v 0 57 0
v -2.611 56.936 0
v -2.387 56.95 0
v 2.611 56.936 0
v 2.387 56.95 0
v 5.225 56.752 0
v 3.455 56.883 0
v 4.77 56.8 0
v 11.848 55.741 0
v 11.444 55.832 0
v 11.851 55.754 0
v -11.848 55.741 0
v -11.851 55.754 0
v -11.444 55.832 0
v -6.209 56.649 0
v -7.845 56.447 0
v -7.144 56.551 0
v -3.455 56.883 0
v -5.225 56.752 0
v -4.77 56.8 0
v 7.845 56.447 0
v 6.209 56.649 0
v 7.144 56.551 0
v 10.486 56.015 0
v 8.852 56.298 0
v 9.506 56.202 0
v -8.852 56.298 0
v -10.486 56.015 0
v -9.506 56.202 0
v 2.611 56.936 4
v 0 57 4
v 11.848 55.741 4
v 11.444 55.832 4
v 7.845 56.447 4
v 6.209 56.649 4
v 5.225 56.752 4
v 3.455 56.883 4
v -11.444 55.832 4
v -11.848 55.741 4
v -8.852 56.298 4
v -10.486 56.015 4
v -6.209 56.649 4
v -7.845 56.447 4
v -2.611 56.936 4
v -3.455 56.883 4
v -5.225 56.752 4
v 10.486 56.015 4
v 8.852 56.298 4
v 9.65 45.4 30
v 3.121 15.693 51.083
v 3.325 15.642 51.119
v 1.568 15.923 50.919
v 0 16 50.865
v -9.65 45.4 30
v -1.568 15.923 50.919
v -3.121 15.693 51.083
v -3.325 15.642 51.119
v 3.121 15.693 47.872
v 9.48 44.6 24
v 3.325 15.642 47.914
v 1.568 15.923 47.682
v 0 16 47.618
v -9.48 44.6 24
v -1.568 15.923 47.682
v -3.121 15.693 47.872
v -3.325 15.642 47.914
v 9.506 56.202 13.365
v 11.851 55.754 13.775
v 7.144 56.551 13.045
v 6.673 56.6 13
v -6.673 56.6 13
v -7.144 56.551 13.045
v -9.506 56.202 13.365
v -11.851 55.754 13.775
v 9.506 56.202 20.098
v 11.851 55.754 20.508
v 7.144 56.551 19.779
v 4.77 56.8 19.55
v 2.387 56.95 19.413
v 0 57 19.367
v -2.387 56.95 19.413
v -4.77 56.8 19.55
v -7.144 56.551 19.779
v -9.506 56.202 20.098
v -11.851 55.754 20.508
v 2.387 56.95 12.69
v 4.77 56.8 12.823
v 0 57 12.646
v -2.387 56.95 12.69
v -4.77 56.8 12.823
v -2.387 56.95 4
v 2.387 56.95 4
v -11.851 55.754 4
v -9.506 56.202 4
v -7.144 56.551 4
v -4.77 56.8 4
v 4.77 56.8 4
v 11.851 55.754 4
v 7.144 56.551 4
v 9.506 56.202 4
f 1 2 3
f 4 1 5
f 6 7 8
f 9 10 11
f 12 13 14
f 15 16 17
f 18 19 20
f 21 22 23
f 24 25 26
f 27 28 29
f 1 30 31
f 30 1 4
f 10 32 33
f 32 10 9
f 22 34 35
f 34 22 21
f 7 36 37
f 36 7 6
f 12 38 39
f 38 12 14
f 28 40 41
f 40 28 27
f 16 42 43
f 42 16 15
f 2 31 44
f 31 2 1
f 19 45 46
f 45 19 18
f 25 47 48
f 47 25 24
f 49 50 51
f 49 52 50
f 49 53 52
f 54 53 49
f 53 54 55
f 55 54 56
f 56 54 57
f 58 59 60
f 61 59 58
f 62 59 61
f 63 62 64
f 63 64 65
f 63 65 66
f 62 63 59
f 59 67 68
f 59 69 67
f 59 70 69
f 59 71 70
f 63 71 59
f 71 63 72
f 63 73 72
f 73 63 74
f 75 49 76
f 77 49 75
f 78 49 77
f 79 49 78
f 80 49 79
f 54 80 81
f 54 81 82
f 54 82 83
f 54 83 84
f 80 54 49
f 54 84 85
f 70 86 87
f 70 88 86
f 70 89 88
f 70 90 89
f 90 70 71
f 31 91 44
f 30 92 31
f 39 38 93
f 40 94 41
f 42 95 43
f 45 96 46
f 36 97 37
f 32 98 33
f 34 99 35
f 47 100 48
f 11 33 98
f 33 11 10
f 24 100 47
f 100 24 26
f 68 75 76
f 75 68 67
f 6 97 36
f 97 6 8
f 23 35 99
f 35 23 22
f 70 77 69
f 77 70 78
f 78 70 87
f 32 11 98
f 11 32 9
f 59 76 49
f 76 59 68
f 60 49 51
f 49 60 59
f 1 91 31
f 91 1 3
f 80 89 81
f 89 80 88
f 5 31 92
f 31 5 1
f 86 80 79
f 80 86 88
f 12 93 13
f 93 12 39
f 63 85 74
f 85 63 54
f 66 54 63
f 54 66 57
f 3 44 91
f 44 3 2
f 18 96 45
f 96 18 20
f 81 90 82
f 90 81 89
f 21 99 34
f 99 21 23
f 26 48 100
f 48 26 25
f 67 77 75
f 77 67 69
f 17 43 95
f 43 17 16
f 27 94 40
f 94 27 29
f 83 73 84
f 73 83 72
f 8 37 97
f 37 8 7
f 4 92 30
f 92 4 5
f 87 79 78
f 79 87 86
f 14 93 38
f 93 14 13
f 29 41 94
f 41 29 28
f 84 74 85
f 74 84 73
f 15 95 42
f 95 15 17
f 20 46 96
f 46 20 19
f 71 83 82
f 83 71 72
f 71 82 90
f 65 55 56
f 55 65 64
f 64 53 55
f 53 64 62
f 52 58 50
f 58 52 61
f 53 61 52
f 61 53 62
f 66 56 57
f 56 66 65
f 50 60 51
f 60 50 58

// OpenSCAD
// file: part_b3_base_body.scad
// ============================================================================
// v3 PART B3 — base body (lower): electronics bay + integral 45 deg chute
//
// Splitting the housing here is what makes both halves printable: this one goes
// open-end-down, so the chute floor and the wall notch are all self-supporting.
//
// The ramp is one continuous surface from under the deck's wedge to the lip over
// the tray: the stations are hulled in sequence, and the notch through the wall
// is cut with its sill on the ramp line so it never breaches the floor.
// ============================================================================

include <parameters_v3.scad>;
include <lib_v3.scad>;

$fn = 128;

n_st = len(chute_stations);

module b3_floor_station(st) {
    w = st[2] + 2 * chute_wall;
    translate([-w / 2, st[0] - 0.4, st[1] - st[4]])
        cube([w, 0.8, st[4]]);
}

module b3_wall_station(st, side) {
    h = max(0.8, st[3] - st[1]);
    mirror([side < 0 ? 1 : 0, 0, 0])
        translate([st[2] / 2, st[0] - 0.4, st[1]]) cube([chute_wall, 0.8, h]);
}

// The ramp, as one continuous surface from under the deck's wedge to the lip.
module b3_chute_floor() {
    for (i = [0 : n_st - 2]) hull() {
        b3_floor_station(chute_stations[i]);
        b3_floor_station(chute_stations[i + 1]);
    }
}

module b3_chute_walls() {
    for (i = [0 : n_st - 2], s = [-1, 1]) hull() {
        b3_wall_station(chute_stations[i], s);
        b3_wall_station(chute_stations[i + 1], s);
    }
}

// The notch is a box MINUS the chute itself, so it can only ever remove housing
// wall — the ramp and the chute's side walls survive whatever the box does.
// A plain box (the first attempt) sliced the ramp out exactly where it passes
// through the wall and left a hole a tablet dropped through. Putting the box's
// sill on the ramp line closed the hole but made the cut coplanar with the
// ramp's own top surface, which is fragile; subtracting the chute is exact.
module b3_wall_notch(w, z0, z_top) {
    difference() {
        translate([-w / 2, h_ri - 5, z0])
            cube([w, (h_od / 2 + 4) - (h_ri - 5), z_top - z0]);
        b3_chute_floor();
        b3_chute_walls();
    }
}

// Shoulder fins tying the chute back into the bore. They also stiffen the wall
// either side of the notch. Below the deck, so they cannot foul the carousel.
module b3_shoulder(side) {
    st = chute_stations[1];
    mirror([side < 0 ? 1 : 0, 0, 0])
        intersection() {
            translate([st[2] / 2, st[0] - 1.5, st[1] - st[4]])
                cube([30, 3.0, st[3] - st[1] + st[4]]);
            cylinder(h = deck_z, d = h_id + wall);   // buried in the wall, no coplanar faces
        }
}

module b3_ear() {
    hull() {
        translate([h_od / 2 - 2, -ear_w / 2, deck_z - ear_t]) cube([ear_out + 2, ear_w, ear_t]);
        translate([h_od / 2 - 2, -ear_w / 2, deck_z - ear_t - 2]) cube([2, ear_w, 2]);
    }
}

module base_body_v3() {
    difference() {
        union() {
            tube(h_od, h_id, deck_z);

            // Chute: continuous ramp plus side walls sealing up to the deck.
            b3_chute_floor();
            b3_chute_walls();

            for (s = [-1, 1]) b3_shoulder(s);

            // Base-cover posts, grown from the build plate.
            for (a = post_angles)
                rotate([0, 0, a]) translate([post_r, 0, 0])
                    cylinder(h = 16, d = post_d);

            for (a = ear_angles) rotate([0, 0, a]) b3_ear();
        }

        b3_wall_notch(chute_win_w, chute_win_z0, chute_win_z1);

        // Trim anything above the split plane.
        translate([0, 0, deck_z]) cylinder(h = 60, d = h_od + 20);

        for (a = post_angles)
            rotate([0, 0, a]) translate([post_r, 0, -0.1])
                cylinder(h = 13, d = m3_pilot_d);

        for (a = ear_angles)
            rotate([0, 0, a])
                translate([h_od / 2 + ear_out / 2, 0, deck_z - ear_t - 0.1])
                    cylinder(h = ear_t + 0.2, d = m3_pilot_d);

        rotate([0, 0, 180])
            translate([-cable_w / 2, -(h_od / 2 + 2), 5])
                cube([cable_w, wall + 4, cable_h]);
    }
}

base_body_v3();

echo(str("B3 base body: height ", deck_z, ", bay clear height ",
         chute_stations[n_st - 2][1] - chute_wall));
echo(str("B3 chute exit: ", chute_stations[n_st - 1][2], " mm wide at z ",
         chute_stations[n_st - 1][1]));
// file: lib_v3.scad
// ============================================================================
// Shared geometry helpers for the v3 print set.   include <lib_v3.scad>;
// ============================================================================

// Wedge prism, centred on +X, spanning +/- ang/2, rising from z = 0.
module sector_prism(r, ang, h, seg = 64) {
    steps = max(4, ceil(ang / 2.5));   // ~2.5 deg chords, independent of ang
    linear_extrude(height = h)
        polygon(concat(
            [[0, 0]],
            [for (i = [0 : steps])
                let (a = -ang / 2 + ang * i / steps) [r * cos(a), r * sin(a)]]
        ));
}

// Annular sector prism, centred on +X, rising from z = 0.
module ring_sector(r_in, r_out, ang, h, seg = 64) {
    difference() {
        sector_prism(r_out, ang, h, seg);
        translate([0, 0, -0.05]) cylinder(h = h + 0.1, r = r_in, $fn = seg);
    }
}

module tube(od, id, h) {
    difference() {
        cylinder(h = h, d = od);
        translate([0, 0, -0.05]) cylinder(h = h + 0.1, d = id);
    }
}

// Inward ledge with a 45 deg self-supporting underside. Top face at z_top.
module chamfered_ledge(r_wall, w, z_top) {
    rotate_extrude(convexity = 4)
        polygon([[r_wall - w, z_top],
                 [r_wall,     z_top],
                 [r_wall,     z_top - w]]);
}

// Thin slab used as a hull station for the chute trough.
module station_slab(y, z, w, t = 0.6) {
    translate([-w / 2, y - t / 2, z]) cube([w, t, 0.6]);
}
// file: parameters_v3.scad
// ============================================================================
// Automated Pill Dispenser — v3 "integral deck + open carousel"
// Shared parametric dimensions.   include <parameters_v3.scad>;
//
// z = 0 is the underside of the base body; the base cover hangs below it, so
// the table plane is z = base_z. +Y is the front (chute, tray, camera).
//
// Mechanism: the deck holds the pills in. It has ONE wedge opening. The unit
// parks with the JUST-EMPTIED compartment sitting over that opening, so
// nothing can leak; a 45 deg step sweeps the next compartment across the
// opening and gravity empties it. One servo, no gate, no carousel floor.
//
// Sizing rule that makes the park state leak-proof: the opening's angular
// width must fit inside one compartment's interior with margin to spare, at
// the opening's INNER radius (where a divider subtends the most angle):
//
//     open_deg  <=  360/car_n - 2*asin(div_t / (2*open_r_in)) - 2*park_margin
//     24        <=  45        - 8.6                           - 2*6.2
//
// Widening the opening or moving it inward eats the parking margin.
// ============================================================================

// ---------------------------------------------------------------- print / fit
layer_h        = 0.2;
nozzle_d       = 0.4;
wall           = 3.0;
fit_slip       = 0.35;
fit_press      = 0.10;
m3_pilot_d     = 2.55;
m3_free_d      = 3.35;
m2_pilot_d     = 1.65;
m2_free_d      = 2.30;

// ---------------------------------------------------------------- drum
h_od           = 120.0;
h_id           = h_od - 2 * wall;          // 114
h_ri           = h_id / 2;                 // 57
rim_z          = 94.0;                     // top of the deck body wall

// ---------------------------------------------------------------- deck (A3)
deck_z         = 52.0;                     // deck underside / body split plane
deck_t         = 5.0;                      // structural: the deck IS the drum
deck_top       = deck_z + deck_t;          // 57
deck_fillet    = 1.2;                      // fillet where the wall meets the deck

// The one opening.
open_deg       = 24.0;
open_r_in      = 16.0;
open_r_out     = h_ri;                     // breaches the bore: nothing rides past
open_ctr       = 90.0;                     // front (+Y)
open_relief    = 1.2;                      // lead-in relief on the deck top face

// Centre pilot: the carousel's only bearing. Post on the deck, journal in the
// hub, so the drive shaft never carries weight.
pilot_d        = 10.0;
pilot_engage   = 2.75;

// Body joint: three ears outside the drum. Concentricity between bodies is not
// critical — the running surface and the bore are both on the deck body.
ear_angles     = [30, 150, 270];
ear_w          = 18.0;
ear_out        = 7.0;
ear_t          = 8.0;

// ---------------------------------------------------------------- carousel (C3)
car_n          = 8;
car_pitch      = 360 / car_n;              // 45
car_od         = h_id - 1.4;               // 112.6 -> 0.7 mm sweep gap per side
car_r          = car_od / 2;
div_t          = 2.4;
div_h          = 26.0;
div_chamfer    = 1.6;                      // clears the deck/wall fillet
hub_od         = 28.0;
car_gap        = 0.35;                     // divider to deck running gap
car_z          = deck_top + car_gap;       // 57.35
car_top        = car_z + div_h;            // 83.35
pilot_post_h   = car_gap + pilot_engage;   // 3.1
pilot_bore_d   = pilot_d + fit_slip;       // 10.35

// Derived parking margin, echoed by the parts so a bad edit is loud.
park_margin    = (car_pitch - 2 * asin(div_t / (2 * open_r_in)) - open_deg) / 2;

// ---------------------------------------------------------------- drive train
// Hex socket, deliberately loose: it passes torque but cannot side-load the
// carousel, so the pilot post alone defines the axis.
hex_af         = 7.0;
hex_slip       = 0.40;
hex_depth      = 8.0;

shaft_body_d   = 10.0;
shaft_head_d   = 26.0;
shaft_head_t   = 6.0;

// MG90S
servo_l        = 22.8;
servo_w        = 12.2;
servo_case_h   = 22.5;
servo_tab_span = 32.2;
servo_tab_t    = 2.5;
servo_shaft_in = 5.9;
servo_nose_h   = 6.0;
servo_shaft_h  = 4.7;

horn_disc_d    = 20.4;
horn_disc_h    = 4.2;
horn_hole_r    = 7.5;
horn_screw_n   = 4;
horn_boss_d    = 8.5;

// ---------------------------------------------------------------- bracket (E3)
brk_ctr        = 270.0;                    // rear wall, opposite the chute
brk_pad_w      = 26.0;
brk_pad_h      = 40.0;
brk_pad_t      = 6.0;
brk_pad_z0     = 72.0;
brk_screw_z    = [78.0, 90.0];             // through the wall, from outside
brk_arm_w      = 22.0;
brk_arm_t      = 8.0;
brk_arm_top    = 112.0;                    // = the servo flange plane
// The servo plate has to be thinner than the servo's nose (6 mm from flange to
// case top) or the drive shaft's head fouls it. The beam keeps its full depth.
brk_head_t     = 4.5;
brk_rib_h      = 12.0;
brk_web_h      = 26.0;                     // gusset depth at the wall

// ---------------------------------------------------------------- chute (B3)
chute_wall     = 2.4;
// The pill passage plus 0.4 mm, so the notch's cut faces land inside the chute's
// side walls rather than coplanar with their inner faces. The notch subtracts
// the chute solid, so those walls keep their full 2.4 mm and still overlap the
// drum wall by 2.0 mm — that overlap is what fuses the chute into the housing.
chute_win_w    = 32.8;
// The notch is cut as a box MINUS the ramp solid, so it can never breach the
// floor. z0 leaves a hoop strip along the bottom of the wall — it closes the
// first layers into a full ring when printing and stiffens the two wall ends
// either side of the notch. It sits well below the ramp's underside.
chute_win_z0   = 4.0;
chute_win_z1   = deck_z;

// [ y, floor top z, inside width, side-wall top z, floor thickness ]
// The floor thickens toward the exit so its UNDERSIDE runs at 40-42 deg rather
// than following the 38-40 deg top surface: it keeps the overhang printable and
// puts the material where the chute cantilevers out of the wall.
// Station 0 sits at y = 14, inside the wedge's inner radius of 16, so the ramp
// underlaps the opening: every pill through the wedge lands on ramp, never on
// the ramp's leading edge.
chute_stations = [
    [14.0, 52.0, 14.0, 51.9, 2.4],
    [45.0, 30.0, 32.0, 51.8, 6.0],
    [57.0, 19.0, 32.0, 36.0, 6.0],
    [70.0,  8.0, 32.0, 24.0, 6.5],
];

// ---------------------------------------------------------------- tray (F3)
tray_y0        = 68.0;
tray_l         = 62.0;
tray_w         = 78.0;
tray_floor     = 2.0;
tray_h         = 14.0;
tray_mouth_h   = 3.0;                      // cut-down wall, 1.5 mm under the chute lip

// ---------------------------------------------------------------- base (G3)
base_t         = 3.0;
base_z         = -base_t;                  // table plane
post_d         = 9.0;
post_r         = h_ri - post_d / 2 + 0.8;
post_angles    = [70, 190, 310];
cable_w        = 12.0;
cable_h        = 6.0;
// main file
// ============================================================================
// v3 CHECK — is the ramp continuous under the discharge wedge?
//
// Not a printable part. This intersects the base body with the exact volume a
// pill can fall through (the deck's wedge, extruded from the deck's underside
// down to the bay floor) and shows what material is inside it.
//
// How to read it: open in OpenSCAD, F5, then look straight down (Ctrl+4 / top
// view). The wedge footprint must be filled edge to edge. Any daylight through
// it is a hole a tablet will drop through, because the wall notch removes
// everything else under the wedge — whatever you see there is ramp.
//
// Run this after retuning chute_stations, open_deg, open_r_in or chute_win_w.
//
//   MODE = 0   ramp material inside the drop volume  (the check)
//   MODE = 1   the drop volume alone, for orientation
//   MODE = 2   the base body with the drop volume ghosted over it
// ============================================================================

include <parameters_v3.scad>;
include <lib_v3.scad>;
use <part_b3_base_body.scad>;

MODE = 0;

$fn = 128;

module drop_volume() {
    rotate([0, 0, open_ctr])
        ring_sector(open_r_in, open_r_out, open_deg, deck_z);
}

if (MODE == 0) {
    intersection() { base_body_v3(); drop_volume(); }
} else if (MODE == 1) {
    color("#c0392b") drop_volume();
} else {
    base_body_v3();
    color("#c0392b", 0.35) drop_volume();
}

echo(str("Drop volume: ", open_deg, " deg wedge, r ", open_r_in, "-", open_r_out,
         ", from the deck underside at z ", deck_z, " down to the bay floor"));
echo(str("Ramp reaches inward to y = ", chute_stations[0][0],
         " (must be less than open_r_in = ", open_r_in, ")"));
